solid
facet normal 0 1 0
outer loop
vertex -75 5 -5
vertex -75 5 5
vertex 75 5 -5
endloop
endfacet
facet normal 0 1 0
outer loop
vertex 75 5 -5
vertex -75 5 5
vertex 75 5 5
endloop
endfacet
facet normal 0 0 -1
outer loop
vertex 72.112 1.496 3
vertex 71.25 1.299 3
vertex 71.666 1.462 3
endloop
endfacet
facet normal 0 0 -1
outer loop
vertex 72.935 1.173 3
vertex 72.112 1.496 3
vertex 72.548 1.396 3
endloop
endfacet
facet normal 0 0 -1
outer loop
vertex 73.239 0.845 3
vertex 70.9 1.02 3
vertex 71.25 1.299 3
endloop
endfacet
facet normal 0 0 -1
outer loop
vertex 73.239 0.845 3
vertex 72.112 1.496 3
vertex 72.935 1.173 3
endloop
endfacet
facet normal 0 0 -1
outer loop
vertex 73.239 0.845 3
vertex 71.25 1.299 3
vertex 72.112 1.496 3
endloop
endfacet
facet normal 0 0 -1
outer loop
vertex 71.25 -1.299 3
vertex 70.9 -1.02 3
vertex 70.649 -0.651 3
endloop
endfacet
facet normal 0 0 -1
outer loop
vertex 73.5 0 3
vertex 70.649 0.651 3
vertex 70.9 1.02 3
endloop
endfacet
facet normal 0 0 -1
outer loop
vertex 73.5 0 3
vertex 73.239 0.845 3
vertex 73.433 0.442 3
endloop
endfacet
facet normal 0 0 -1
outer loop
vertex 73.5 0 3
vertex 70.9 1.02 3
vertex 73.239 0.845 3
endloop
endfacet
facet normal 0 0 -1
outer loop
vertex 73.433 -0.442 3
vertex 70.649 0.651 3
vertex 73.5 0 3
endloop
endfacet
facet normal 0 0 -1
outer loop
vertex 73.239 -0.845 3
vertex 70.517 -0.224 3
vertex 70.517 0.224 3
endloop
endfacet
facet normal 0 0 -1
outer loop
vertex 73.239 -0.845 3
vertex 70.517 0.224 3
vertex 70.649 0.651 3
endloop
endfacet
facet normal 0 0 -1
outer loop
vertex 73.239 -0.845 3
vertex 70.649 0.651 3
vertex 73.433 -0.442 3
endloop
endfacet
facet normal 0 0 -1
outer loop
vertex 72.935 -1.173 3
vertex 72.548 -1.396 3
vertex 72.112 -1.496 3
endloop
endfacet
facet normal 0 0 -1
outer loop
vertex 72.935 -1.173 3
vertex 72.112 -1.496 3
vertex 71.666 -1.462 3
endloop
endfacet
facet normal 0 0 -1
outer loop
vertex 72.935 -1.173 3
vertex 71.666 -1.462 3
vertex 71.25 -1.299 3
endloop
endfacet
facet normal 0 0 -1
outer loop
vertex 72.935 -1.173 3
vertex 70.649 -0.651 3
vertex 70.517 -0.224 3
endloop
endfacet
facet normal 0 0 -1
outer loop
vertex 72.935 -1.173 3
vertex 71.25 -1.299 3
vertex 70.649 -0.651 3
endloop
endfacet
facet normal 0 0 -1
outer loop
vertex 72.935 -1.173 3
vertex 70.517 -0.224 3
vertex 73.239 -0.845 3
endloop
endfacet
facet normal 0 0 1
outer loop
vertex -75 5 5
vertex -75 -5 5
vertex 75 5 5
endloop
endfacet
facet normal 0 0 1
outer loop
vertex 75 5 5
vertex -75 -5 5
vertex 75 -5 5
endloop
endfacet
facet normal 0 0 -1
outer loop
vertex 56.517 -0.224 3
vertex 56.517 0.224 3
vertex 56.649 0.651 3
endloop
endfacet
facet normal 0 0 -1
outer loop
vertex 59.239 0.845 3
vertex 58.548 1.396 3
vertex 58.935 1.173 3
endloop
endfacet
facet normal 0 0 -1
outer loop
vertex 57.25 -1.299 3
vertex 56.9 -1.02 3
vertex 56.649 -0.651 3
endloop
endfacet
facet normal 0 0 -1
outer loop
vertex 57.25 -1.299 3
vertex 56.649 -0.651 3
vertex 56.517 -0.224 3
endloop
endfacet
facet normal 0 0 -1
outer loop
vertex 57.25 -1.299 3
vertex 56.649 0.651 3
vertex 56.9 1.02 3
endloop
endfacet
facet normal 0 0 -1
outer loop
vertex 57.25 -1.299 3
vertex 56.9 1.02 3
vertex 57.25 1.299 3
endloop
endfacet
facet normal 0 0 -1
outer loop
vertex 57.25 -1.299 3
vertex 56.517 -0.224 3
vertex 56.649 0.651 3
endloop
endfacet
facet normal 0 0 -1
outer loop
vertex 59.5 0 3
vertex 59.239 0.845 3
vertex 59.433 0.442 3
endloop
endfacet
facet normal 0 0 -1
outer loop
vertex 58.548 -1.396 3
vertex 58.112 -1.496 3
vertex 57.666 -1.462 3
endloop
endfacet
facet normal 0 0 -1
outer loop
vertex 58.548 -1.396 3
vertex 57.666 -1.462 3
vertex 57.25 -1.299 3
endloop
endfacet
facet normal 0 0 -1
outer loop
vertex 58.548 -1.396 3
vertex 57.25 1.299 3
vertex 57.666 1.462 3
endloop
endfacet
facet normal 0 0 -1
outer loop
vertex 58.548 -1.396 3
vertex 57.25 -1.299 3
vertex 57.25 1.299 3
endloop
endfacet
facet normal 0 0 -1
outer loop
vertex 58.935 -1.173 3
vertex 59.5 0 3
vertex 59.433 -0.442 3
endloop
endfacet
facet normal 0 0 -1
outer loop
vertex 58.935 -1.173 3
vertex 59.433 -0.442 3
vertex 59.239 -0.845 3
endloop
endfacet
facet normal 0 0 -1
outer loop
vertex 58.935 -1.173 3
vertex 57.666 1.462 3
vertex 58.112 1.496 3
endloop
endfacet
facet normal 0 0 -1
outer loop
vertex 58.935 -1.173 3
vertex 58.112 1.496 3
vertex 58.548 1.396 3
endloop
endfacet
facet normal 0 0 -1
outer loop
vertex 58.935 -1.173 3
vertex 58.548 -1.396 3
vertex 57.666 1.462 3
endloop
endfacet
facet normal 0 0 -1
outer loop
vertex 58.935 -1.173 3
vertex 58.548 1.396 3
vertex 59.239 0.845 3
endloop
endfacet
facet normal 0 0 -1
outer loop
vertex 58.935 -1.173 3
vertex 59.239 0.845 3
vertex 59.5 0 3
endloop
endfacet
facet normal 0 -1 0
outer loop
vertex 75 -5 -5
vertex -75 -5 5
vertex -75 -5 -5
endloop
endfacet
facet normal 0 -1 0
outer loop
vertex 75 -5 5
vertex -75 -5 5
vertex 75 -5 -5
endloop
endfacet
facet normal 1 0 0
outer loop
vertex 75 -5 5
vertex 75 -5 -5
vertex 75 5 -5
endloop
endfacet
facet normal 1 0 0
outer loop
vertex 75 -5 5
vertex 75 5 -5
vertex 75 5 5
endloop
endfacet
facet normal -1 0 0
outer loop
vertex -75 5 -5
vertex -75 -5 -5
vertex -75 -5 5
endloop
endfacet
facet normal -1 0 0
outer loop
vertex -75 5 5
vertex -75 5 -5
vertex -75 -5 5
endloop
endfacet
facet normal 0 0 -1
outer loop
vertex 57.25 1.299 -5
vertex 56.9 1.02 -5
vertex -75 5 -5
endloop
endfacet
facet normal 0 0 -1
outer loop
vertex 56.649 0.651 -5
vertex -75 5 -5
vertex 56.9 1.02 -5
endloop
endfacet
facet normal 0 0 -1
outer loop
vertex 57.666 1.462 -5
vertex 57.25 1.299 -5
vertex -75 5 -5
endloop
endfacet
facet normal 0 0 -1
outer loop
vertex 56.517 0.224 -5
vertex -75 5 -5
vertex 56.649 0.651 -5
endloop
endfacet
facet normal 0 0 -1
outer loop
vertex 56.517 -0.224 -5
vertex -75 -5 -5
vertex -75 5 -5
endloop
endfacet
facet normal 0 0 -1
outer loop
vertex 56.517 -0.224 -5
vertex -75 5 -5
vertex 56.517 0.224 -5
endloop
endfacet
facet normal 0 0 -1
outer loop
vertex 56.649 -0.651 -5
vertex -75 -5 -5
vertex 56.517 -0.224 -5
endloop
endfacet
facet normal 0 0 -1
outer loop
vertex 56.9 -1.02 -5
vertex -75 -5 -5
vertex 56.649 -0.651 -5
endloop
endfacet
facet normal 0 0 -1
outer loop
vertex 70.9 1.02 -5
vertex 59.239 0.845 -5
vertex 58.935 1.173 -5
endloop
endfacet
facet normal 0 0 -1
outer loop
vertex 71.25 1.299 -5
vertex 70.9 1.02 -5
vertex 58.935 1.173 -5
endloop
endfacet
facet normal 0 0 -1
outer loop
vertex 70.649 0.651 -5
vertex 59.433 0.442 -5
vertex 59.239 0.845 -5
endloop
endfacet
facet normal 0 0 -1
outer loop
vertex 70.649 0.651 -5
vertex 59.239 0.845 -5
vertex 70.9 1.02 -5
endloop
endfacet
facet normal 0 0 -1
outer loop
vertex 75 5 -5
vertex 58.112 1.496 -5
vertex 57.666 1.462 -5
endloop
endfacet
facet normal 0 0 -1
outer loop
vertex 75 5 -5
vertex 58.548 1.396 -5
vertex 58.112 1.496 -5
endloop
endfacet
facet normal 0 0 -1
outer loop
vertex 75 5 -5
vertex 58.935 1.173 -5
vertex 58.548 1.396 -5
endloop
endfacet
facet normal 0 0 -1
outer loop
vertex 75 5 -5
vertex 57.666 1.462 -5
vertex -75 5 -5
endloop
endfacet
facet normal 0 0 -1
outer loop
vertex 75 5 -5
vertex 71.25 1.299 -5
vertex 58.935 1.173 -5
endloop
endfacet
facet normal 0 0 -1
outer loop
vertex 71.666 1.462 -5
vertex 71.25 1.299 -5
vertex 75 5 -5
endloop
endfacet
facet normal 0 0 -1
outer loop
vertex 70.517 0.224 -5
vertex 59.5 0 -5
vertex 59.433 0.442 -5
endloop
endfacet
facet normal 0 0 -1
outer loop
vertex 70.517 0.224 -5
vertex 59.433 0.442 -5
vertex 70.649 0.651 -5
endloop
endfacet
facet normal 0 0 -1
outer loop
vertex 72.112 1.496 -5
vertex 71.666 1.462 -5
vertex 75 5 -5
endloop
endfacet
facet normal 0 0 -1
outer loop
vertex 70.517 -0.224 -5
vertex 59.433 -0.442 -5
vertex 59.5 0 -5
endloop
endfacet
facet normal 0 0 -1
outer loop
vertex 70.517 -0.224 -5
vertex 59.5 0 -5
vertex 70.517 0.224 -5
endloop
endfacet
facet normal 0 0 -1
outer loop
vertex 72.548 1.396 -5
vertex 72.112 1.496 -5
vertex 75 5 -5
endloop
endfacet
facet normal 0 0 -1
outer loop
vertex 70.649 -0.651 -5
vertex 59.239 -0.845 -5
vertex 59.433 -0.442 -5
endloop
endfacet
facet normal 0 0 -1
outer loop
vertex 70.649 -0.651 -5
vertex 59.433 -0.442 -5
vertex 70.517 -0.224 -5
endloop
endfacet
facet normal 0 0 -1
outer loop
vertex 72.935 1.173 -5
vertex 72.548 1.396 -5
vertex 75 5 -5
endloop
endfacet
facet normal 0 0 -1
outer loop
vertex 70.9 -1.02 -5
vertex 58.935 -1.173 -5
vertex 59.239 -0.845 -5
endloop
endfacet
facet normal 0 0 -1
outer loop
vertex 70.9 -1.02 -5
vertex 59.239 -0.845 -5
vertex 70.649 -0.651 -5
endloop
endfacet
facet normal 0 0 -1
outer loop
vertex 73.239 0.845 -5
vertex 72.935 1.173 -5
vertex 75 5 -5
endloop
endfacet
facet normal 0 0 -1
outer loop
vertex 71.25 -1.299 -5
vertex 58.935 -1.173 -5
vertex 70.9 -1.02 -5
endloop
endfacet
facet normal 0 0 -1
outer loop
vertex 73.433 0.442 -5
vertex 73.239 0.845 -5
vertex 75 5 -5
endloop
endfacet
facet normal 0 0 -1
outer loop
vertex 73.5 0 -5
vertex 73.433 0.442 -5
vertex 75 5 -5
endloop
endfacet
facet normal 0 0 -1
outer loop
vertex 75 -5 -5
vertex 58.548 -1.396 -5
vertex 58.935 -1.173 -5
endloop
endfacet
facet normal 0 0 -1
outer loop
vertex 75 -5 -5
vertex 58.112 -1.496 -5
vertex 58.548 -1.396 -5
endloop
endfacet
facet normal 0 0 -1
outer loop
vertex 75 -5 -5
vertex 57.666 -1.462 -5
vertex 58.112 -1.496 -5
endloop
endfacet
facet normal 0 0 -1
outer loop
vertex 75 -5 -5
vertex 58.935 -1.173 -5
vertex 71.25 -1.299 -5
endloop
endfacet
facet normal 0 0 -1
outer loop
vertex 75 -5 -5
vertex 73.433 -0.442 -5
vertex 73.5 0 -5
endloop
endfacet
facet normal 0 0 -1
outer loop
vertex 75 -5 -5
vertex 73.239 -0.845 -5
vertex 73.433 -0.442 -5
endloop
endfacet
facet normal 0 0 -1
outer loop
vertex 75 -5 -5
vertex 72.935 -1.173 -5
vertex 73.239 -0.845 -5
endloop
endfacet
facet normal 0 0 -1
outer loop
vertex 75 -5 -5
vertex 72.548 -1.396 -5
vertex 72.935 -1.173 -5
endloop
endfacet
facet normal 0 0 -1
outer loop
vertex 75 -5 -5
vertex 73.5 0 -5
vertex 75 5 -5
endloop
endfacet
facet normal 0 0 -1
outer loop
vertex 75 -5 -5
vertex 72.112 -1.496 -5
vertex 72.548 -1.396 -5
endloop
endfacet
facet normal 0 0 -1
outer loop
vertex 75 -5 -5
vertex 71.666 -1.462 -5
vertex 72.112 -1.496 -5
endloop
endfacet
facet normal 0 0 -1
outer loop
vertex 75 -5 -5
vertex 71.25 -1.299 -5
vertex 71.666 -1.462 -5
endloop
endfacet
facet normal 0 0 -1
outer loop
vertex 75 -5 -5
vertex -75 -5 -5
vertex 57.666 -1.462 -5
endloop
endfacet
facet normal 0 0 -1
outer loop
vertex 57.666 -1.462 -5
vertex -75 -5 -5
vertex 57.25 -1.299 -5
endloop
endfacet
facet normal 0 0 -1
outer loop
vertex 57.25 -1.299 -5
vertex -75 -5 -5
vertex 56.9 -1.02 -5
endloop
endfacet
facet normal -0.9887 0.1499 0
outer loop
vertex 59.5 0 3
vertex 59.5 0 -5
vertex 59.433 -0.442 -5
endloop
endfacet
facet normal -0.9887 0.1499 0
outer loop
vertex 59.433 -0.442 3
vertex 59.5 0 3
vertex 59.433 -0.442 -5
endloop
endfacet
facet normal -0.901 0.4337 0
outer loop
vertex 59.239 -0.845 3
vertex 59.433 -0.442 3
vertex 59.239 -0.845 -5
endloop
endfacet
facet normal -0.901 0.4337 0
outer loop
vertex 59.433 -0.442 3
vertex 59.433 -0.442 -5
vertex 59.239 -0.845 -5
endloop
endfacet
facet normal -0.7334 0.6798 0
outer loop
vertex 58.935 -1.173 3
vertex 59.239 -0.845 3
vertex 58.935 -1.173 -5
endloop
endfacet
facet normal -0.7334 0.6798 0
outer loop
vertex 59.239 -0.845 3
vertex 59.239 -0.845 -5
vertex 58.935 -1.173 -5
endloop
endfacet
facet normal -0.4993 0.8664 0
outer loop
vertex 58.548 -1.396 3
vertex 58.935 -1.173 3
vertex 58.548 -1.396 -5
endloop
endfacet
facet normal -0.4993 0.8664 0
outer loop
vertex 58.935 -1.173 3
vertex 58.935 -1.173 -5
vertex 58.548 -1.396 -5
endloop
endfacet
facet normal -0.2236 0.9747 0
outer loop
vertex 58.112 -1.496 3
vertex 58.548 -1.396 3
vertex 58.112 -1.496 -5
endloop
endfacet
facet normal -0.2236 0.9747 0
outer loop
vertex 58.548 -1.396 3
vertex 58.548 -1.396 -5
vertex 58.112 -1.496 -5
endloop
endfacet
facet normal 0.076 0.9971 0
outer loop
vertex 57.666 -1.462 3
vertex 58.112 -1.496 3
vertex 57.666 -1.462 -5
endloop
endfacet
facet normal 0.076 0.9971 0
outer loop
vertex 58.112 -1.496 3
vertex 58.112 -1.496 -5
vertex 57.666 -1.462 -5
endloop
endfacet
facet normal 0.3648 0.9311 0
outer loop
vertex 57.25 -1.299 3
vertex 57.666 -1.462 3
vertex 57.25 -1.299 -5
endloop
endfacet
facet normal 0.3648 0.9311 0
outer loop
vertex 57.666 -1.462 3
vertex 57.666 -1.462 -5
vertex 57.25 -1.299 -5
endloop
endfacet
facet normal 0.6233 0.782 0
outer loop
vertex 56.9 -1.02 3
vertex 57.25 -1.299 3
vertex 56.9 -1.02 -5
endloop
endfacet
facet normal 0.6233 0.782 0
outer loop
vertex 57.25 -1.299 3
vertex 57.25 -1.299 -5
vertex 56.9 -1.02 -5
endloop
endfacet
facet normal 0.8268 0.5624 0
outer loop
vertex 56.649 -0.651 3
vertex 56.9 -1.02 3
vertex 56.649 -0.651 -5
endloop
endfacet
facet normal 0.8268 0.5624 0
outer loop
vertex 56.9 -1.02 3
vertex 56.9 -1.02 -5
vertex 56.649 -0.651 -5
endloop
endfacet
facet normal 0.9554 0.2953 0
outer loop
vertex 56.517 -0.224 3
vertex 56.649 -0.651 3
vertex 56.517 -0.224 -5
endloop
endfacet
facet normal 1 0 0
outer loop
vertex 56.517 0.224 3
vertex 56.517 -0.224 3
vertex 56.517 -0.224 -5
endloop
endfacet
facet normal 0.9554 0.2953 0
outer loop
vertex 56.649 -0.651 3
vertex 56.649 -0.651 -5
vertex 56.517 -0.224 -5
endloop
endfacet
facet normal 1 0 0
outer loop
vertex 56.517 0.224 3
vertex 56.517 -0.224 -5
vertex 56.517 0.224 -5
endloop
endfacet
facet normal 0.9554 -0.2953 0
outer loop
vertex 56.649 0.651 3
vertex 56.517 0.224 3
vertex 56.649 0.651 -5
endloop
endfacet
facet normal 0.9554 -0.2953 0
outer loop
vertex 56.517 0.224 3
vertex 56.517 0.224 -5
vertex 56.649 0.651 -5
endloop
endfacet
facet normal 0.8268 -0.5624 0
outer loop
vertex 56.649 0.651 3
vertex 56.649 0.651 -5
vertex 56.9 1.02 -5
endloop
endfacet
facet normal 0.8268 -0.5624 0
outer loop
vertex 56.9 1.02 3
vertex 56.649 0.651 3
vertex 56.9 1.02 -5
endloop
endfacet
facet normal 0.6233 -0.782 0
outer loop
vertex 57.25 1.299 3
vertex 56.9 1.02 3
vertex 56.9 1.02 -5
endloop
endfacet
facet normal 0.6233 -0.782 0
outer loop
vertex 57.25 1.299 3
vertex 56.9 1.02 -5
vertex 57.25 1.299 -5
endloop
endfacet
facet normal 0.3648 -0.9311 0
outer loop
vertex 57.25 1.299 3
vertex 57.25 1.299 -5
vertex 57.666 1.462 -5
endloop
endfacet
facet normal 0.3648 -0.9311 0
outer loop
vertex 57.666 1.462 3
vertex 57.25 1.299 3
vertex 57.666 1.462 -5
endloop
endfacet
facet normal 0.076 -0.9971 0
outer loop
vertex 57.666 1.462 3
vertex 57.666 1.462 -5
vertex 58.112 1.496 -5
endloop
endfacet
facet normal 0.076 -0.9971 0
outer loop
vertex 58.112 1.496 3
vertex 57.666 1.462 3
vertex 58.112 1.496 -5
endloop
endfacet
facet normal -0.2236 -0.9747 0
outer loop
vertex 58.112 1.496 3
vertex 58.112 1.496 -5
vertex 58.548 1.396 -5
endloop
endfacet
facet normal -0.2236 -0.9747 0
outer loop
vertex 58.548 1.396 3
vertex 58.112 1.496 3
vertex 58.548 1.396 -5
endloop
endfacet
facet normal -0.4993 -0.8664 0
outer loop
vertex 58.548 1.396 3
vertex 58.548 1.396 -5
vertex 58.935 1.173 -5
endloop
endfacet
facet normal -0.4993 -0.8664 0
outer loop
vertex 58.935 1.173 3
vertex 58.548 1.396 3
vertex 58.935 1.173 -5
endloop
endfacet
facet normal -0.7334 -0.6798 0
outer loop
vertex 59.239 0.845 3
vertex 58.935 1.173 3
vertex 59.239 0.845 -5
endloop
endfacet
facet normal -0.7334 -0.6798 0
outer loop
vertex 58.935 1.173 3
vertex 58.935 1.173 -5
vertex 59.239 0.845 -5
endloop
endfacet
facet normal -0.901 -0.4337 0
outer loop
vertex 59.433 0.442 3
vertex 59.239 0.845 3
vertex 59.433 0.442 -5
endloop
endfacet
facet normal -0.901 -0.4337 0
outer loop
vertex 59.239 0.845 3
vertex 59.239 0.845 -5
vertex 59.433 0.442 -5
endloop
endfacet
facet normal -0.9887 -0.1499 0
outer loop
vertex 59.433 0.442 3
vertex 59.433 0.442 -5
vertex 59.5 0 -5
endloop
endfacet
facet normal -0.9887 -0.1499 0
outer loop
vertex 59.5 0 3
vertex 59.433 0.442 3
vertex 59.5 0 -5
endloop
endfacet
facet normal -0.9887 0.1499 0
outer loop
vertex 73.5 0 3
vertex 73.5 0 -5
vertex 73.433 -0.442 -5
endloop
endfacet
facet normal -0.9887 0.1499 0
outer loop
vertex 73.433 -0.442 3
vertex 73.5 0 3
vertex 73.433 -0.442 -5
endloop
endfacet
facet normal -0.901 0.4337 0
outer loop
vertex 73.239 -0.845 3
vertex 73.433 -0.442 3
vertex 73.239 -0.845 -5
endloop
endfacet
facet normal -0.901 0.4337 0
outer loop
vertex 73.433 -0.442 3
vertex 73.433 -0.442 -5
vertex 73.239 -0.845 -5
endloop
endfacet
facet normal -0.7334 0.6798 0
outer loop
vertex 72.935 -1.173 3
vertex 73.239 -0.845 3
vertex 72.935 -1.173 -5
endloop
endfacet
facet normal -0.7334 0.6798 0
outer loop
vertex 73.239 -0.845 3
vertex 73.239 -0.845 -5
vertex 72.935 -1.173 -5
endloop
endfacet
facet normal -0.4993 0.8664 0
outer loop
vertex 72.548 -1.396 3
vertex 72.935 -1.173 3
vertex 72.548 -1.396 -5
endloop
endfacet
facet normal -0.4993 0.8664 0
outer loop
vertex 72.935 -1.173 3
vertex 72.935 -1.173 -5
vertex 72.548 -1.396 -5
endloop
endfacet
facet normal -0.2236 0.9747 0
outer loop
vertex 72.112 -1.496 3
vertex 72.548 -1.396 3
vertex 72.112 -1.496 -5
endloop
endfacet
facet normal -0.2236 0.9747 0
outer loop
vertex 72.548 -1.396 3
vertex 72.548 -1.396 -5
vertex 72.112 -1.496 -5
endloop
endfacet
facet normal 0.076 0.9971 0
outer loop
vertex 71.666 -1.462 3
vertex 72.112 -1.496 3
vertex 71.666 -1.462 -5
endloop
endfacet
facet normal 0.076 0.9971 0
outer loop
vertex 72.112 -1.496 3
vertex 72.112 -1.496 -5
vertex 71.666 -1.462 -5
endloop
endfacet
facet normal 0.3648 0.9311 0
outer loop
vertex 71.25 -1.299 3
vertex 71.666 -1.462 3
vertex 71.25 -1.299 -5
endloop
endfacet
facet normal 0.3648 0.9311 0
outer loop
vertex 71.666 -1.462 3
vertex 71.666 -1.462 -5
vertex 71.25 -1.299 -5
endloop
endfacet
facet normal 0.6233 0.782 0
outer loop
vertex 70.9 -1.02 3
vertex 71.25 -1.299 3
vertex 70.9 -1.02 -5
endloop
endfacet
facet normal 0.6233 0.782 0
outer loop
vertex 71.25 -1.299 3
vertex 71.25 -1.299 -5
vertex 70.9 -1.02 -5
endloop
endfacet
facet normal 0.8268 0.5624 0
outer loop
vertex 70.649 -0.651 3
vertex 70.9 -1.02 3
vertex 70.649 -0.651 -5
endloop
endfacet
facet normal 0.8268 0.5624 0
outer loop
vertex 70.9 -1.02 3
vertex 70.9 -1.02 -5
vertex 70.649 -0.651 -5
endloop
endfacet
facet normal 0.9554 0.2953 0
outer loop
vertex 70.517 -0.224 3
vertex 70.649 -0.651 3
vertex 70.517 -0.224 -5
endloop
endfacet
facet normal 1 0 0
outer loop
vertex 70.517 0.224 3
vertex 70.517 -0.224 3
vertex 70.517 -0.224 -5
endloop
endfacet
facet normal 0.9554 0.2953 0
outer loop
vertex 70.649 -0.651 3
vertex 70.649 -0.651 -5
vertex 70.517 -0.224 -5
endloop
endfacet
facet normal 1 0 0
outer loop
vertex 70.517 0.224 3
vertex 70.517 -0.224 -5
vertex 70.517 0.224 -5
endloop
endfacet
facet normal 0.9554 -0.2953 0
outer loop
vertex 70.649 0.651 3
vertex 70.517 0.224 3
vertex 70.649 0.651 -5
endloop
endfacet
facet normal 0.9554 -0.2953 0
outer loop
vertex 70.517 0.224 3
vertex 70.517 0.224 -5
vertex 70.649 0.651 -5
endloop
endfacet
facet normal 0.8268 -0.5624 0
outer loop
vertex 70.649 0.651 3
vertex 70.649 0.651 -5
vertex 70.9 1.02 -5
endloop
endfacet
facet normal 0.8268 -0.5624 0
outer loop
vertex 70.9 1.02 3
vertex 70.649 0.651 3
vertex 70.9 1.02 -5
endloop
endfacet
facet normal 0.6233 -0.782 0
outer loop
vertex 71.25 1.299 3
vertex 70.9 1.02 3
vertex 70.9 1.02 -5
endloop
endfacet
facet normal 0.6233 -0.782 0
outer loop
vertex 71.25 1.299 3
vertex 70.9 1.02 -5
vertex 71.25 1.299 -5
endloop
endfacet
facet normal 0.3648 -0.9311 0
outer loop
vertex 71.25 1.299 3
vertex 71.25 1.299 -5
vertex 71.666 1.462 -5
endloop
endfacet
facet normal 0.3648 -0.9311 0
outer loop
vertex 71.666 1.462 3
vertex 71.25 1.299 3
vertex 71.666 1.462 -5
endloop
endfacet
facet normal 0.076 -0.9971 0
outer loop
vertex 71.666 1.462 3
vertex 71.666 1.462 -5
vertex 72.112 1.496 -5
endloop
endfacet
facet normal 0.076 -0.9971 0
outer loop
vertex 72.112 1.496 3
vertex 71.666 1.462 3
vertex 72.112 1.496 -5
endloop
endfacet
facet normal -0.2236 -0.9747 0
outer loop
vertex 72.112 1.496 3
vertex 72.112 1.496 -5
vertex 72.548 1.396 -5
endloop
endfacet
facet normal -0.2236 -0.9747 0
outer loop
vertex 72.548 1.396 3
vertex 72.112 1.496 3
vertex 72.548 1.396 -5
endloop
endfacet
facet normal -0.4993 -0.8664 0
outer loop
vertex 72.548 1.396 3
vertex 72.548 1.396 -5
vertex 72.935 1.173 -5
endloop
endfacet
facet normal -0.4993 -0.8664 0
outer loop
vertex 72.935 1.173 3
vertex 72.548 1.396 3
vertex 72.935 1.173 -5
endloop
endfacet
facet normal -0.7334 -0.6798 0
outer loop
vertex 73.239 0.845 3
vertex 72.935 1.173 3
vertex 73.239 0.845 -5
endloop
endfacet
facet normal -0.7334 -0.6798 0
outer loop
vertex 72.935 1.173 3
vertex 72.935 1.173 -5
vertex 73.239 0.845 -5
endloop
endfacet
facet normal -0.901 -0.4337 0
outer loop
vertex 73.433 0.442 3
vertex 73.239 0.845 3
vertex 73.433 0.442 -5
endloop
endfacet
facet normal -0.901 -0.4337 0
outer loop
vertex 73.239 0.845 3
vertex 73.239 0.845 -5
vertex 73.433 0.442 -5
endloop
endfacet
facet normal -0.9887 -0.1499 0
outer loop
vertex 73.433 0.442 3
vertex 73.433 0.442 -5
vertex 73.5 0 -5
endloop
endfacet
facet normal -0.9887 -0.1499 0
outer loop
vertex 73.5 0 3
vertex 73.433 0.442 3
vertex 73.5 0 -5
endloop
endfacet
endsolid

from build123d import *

# Parameters (mm, degrees)
F0_W     = 150
F0_H     = 10
F1_DEPTH = 5
F2_R     = 1.5
F3_DEPTH = 8


with BuildPart() as f1:
    # F0 (on Front) → F1 (new body, symmetric)
    with BuildSketch(Plane.XZ):
        Rectangle(F0_W, F0_H)
    extrude(amount=F1_DEPTH, both=True)

    # F2 (on face) → F3 (cut)
    with BuildSketch(Plane(origin=(0, 0, -5), x_dir=(1, 0, 0), z_dir=(0, 0, -1))):
        with Locations((72, 0)):
            Circle(F2_R)
        with Locations((58, 0)):
            Circle(F2_R)
    extrude(amount=-F3_DEPTH, mode=Mode.SUBTRACT)


solid = f1.part
